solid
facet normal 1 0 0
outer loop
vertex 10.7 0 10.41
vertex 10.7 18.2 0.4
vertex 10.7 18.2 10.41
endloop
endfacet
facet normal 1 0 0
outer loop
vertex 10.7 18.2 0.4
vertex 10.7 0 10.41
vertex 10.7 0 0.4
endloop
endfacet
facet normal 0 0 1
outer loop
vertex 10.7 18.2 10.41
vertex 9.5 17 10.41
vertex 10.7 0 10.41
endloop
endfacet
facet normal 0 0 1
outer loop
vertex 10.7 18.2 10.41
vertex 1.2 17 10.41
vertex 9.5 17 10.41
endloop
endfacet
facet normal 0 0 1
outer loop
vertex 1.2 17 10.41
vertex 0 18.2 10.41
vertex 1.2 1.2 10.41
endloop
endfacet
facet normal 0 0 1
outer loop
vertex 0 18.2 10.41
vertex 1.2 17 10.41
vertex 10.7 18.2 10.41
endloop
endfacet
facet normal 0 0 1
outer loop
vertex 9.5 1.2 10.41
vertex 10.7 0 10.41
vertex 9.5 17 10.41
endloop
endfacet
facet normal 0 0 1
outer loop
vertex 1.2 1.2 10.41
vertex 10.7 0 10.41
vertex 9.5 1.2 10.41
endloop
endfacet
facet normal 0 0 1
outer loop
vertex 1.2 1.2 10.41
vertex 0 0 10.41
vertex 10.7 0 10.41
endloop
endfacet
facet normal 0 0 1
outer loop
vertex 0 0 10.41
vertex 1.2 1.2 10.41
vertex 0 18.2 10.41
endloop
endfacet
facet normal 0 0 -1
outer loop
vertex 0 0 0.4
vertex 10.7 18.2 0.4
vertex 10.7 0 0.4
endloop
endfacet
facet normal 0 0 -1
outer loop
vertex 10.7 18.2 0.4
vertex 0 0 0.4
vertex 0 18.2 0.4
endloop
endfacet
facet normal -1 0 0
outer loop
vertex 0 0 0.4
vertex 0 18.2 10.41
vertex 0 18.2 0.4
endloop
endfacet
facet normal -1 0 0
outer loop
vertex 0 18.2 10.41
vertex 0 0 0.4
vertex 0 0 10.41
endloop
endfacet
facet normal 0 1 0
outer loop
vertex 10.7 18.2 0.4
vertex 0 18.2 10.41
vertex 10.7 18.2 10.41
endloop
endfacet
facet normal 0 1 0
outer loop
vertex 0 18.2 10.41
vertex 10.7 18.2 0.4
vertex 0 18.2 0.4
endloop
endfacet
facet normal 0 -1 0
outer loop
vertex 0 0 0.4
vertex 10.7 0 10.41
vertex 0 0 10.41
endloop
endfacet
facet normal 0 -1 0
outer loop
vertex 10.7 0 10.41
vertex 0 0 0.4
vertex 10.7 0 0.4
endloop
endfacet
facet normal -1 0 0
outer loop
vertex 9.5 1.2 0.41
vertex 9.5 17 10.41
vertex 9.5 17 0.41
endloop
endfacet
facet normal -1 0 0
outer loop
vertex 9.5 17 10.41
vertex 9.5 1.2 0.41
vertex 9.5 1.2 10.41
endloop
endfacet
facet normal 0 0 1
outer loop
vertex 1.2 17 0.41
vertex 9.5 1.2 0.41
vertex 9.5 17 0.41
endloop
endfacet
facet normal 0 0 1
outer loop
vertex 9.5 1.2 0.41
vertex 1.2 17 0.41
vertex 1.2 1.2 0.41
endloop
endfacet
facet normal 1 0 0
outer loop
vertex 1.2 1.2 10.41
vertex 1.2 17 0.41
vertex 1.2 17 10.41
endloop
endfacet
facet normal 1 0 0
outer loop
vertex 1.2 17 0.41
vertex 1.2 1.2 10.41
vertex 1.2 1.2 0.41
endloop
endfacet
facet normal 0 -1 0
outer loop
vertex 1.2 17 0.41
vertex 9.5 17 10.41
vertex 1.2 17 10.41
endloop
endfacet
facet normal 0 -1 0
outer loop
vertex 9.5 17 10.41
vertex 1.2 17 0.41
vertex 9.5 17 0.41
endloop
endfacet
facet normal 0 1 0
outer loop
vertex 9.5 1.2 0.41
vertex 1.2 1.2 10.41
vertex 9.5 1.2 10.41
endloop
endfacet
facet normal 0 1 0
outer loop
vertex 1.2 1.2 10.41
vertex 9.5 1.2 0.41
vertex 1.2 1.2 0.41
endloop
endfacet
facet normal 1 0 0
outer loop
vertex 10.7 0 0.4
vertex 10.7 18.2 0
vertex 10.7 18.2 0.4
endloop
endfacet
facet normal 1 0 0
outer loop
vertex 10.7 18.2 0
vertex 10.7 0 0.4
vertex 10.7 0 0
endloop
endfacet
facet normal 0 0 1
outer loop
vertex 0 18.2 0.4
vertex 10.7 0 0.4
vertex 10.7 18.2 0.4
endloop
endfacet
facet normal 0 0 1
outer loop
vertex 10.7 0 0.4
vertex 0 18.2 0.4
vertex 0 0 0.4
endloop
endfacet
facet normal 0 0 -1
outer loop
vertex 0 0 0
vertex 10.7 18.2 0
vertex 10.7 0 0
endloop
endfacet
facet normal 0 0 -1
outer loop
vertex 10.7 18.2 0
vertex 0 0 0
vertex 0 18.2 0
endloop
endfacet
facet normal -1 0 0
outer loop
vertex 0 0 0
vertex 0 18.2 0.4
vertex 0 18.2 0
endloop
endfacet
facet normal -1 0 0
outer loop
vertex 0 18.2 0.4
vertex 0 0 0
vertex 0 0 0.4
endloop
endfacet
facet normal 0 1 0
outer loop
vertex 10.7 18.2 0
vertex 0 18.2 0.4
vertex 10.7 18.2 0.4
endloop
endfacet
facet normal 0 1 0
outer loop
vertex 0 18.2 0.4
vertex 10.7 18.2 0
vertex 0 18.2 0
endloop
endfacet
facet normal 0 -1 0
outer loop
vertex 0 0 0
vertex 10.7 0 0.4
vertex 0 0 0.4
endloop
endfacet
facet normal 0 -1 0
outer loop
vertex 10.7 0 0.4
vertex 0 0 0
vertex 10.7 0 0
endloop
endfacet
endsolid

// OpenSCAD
// file: ../../Base/Rotation.scad
// Fischertechnik Box Foundation
// Geometry Helpers Rotation

include <PlacementOptions.scad>

// getRotatedSpace(space, rotation=NoRotation)
// Rotates the space dependent on the specified rotation

function getRotatedSpace(space, rotation=NoRotation) = [
    (rotation == Rotate90 || rotation == Rotate270) ? space.y : space.x,
    (rotation == Rotate90 || rotation == Rotate270) ? space.x : space.y
];

// Rotates the given space around the fixed left lower corner
// space = the space the children needs as width/depth list [width,depth]
// rotation = 0 Rotate0 degrees, 1 Rotate90 degrees, 2 Rotate180 degrees, 3 Rotate270 degrees (equivalent to -90)

module RotateFix(space, rotation=NoRotation) {
    dy = (rotation == Rotate0 || rotation == Rotate270) ? 0 :
        (rotation == Rotate90) ? space.x :
        space.y;
    dx = (rotation < Rotate180) ? 0 :
        (rotation == Rotate180) ? space.x :
        space.y;
    
    translate([dx, dy, 0])
        rotate([0, 0, rotations[rotation]])
            children();
}
// file: ../../Base/Alignment.scad
// Fischertechnik Box Foundation
// Geometry Helpers Alignment

include <PlacementOptions.scad>

// getAlignedX(elementWidth, spaceWidth, align=AlignRight, offset=0)
// Gets the aligned X offset of an element with the given
// width in the given space.
// elementWidth = The width of the element to positon
// spaceWidth = The space where the element should be aligned
// align = 0 AlignLeft, 1 AlignCenter, 2 AlignRight
// offset = an optional offset from the aligned position. When
// aligned left or centered, then positive values are in X direction.
// When aligned right then positive values are in negative X direction.

function getAlignedX(elementWidth, spaceWidth, align=AlignRight, offset=0) =
    (align == AlignLeft) ?
        offset :
        ((align == AlignCenter) ?
        (spaceWidth - elementWidth)/2 + offset :
        spaceWidth - offset - elementWidth);

// getAlignedY(elementDepth, spaceDepth, align=AlignTop, offset=0)
// Gets the aligned Y offset of an element with the given
// depth in the given space.
// elementDepth = The depth of the element to positon
// spaceDepth = The space where the element should be aligned
// align = 0 AlignBottom, 1 AlignCenter, 2 AlignTop
// offset = an optional offset from the aligned position. When
// aligned bottom or centered, then positive values are in Y direction.
// When aligned top then positive values are in negative Y direction.

function getAlignedY(elementDepth, spaceDepth, align=AlignTop, offset=0) =
    (align == AlignBottom) ?
        offset :
        ((align == AlignCenter) ?
        (spaceDepth - elementDepth)/2 + offset :
        spaceDepth - offset - elementDepth);
// file: ../../Base/PlacementOptions.scad
// Fischertechnik Box Foundation
// Placement Options

// Alignment
NoAlign = 0;
AlignLeft = 1;
AlignBottom = 2;
AlignCenter = 3;
AlignRight = 4;
AlignTop = 5;

// Element rotation degree steps
rotations = [0, -90, -180, -270];

// Rotation
NoRotation = 0;
Rotate0 = 0;
Rotate90 = 1;
Rotate180 = 2;
Rotate270 = 3;

// Docking (seen from above)
NoDock = -1;
DockLeft = 0;
DockTop = 1;
DockRight = 2;
DockCorner = 2;
DockBottom = 3;

// Web corners
LowerLeft = 0;
UpperLeft = 1;
UpperRight = 2;
LowerRight = 3;

// Web position relative to corner
LeftOfCorner = 0;
RightOfCorner = 1;

// Rails direction
Horizontal = true;
Vertical = false;
// file: ../../Base/Boxes.scad
// Fischertechnik Box Foundation
// Pre-designed Boxes

use <Constants.scad>

include <PlacementOptions.scad>

box190Width = 190.6;
box190Depth = 130.6;
box130Width = 130.6;
box130Depth = 95.6;

// Values are from an original Box 1000 sorting box
topBottomDifference = 1.7;
outerHeight = 40;
baseThickness = 1.2;
innerHeight = outerHeight - baseThickness;
stackExcess = 5.7;
radius = 2.5;
wallThickness = 1.2;
tolerance = 0.2;

boxWallThickness = wallThickness;
boxBaseThickness = baseThickness;
boxWebWidth = 3.0;

// getBoxWallThickness()
// Gets the wall thickness of a Fischertechnik Box
function getBoxWallThickness() = boxWallThickness;

// getBoxUsageHeight(height = 38.2)
// Gets the usable height of a Fischertechnik box
// height = Outer height of the box from the bottom to the upper edge.
function getBoxUsageHeight(height = outerHeight) = height - baseThickness - stackExcess;

// getBoxInnerHeight()
// Gets the inner height of a Fischertechnik box, including the stack excess
function getBoxInnerHeight() = innerHeight;

// getBoxBaseThickness()
// Gets the thickness of the Fischertechnik box base.
function getBoxBaseThickness() = boxBaseThickness;

// getBoxWebWidth()
// Gets the width of a box web
function getBoxWebWidth() = boxWebWidth;

// getBox190Space()
// Gets the usable inner space of a Box 190 as an x/y-list
function getBox190Space() = [
    box190Width - 2*getBoxWallThickness() - topBottomDifference, 
    box190Depth - 2*getBoxWallThickness() - topBottomDifference ];

// RoundedCornerPlate(width, depth, height, radius)
// Creates a body plate with rounded corners for a box. Used
// also to create the complete box with the hull module.
// width = Width of the plate
// depth = depth of the plate 
// height = thickness of the plate
// radius = radius of the rounded corner
module RoundedCornerPlate(width, depth, height, radius) {
    translate([radius, radius])
    hull() {
        w = width-2*radius;
        d = depth-2*radius;
        cube([w, d, height]);
        cylinder(height, r=radius, $fn=getFragments());
        translate([w, 0])
            cylinder(height, r=radius, $fn=getFragments());
        translate([w, d])
            cylinder(height, r=radius, $fn=getFragments());
        translate([0, d])
            cylinder(height, r=radius, $fn=getFragments());
    }
}

// BoxBase(width, depth)
// Creates an empty stackable Fischertechnik compatible box
// width = Outer width of the box (190, 130, ...)
// depth = Outer depth of the box (130, 95, ...)

module BoxBase(width, depth, height=outerHeight) {    
    thinPlate = 0.01;

    innerHeight = height - baseThickness;    
    
    module Body(tolerance=tolerance) {
        hull() {
            // Bottom with tolerance to fit into the original boxes when stacked
            translate([-wallThickness+tolerance, -wallThickness+tolerance, -baseThickness])
                RoundedCornerPlate(width-topBottomDifference-2*tolerance, depth-topBottomDifference-2*tolerance, thinPlate, radius);
            
            // Top
            translate([-wallThickness-topBottomDifference/2, -wallThickness-topBottomDifference/2, innerHeight-thinPlate])
                RoundedCornerPlate(width, depth, thinPlate, radius);                
         }
    }

    module Cutoff() {
        hull() {
            coWidth = width - 2*wallThickness;
            coDepth = depth - 2*wallThickness;
            
            // Bottom
            RoundedCornerPlate(coWidth-topBottomDifference, coDepth-topBottomDifference, thinPlate, radius);

            // Top
            translate([-topBottomDifference/2, -topBottomDifference/2, innerHeight+thinPlate]) 
                RoundedCornerPlate(coWidth, coDepth, thinPlate, radius);
        }
    }
    
    difference() {        
        Body();
        Cutoff();
        stackOffset = innerHeight - stackExcess;
        translate([0, 0, stackOffset + baseThickness])
            Body(tolerance=0);
    }
}

// Creates the Fischertechnik empty box 130x190 mm and places it at position 0,0
// 190x130 are the outer sizes, the inner space is slightly smaller. Use getBox190Space() to get the inner sizes.
// The box is positioned that the usable inner space is at the 0,0,0 position.

module Box190() {
    BoxBase(box190Width, box190Depth);
}

// Gets the usable inner space of a Box 130 as an x/y-list
function getBox130Space() = [
    box130Width - 2*getBoxWallThickness() - topBottomDifference, 
    box130Depth - 2*getBoxWallThickness() - topBottomDifference ];

// Creates the Fischertechnik empty box 95x130 mm and places it at position 0,0
// 190x130 are the outer sizes, the inner space is slightly smaller. Use getBox190Space() to get the inner sizes.
// The box is positioned that the usable inner space is at the 0,0,0 position.

module Box130() {
    BoxBase(box130Width, box130Depth);
}

// Creates a web at the specified box walls
// corner 0 = LowerLeft, 1 = UpperLeft, 2 = UpperRight, 3 = LowerRight
// side 0 = LeftOfCorner, 1 = RightOfCorner
// distance = Distance in mm from the corner
// boxSpace = inner width and depth of the box (default: Box 190)
// webWidth = length of the web (default is 3 mms)
// webThickness = thickness of the web (default is 1 mm)
// height = Height of the web (standard is getBoxUsageHeight())
// sink = How much of the web is sunk into the wall

module BoxWeb(
    corner, 
    side, 
    distance, 
    boxSpace=getBox190Space(), 
    webWidth=getBoxWebWidth(), 
    webThickness=1.0, 
    height=getBoxUsageHeight(),
    sink = getBoxWallThickness()/2) {
    width = (corner % 2 == 0) ? 
            (side == LeftOfCorner ? webWidth : webThickness) :
            (side == LeftOfCorner ? webThickness : webWidth);

    depth = (corner % 2 == 0) ? 
            (side == RightOfCorner ? webWidth : webThickness) :
            (side == RightOfCorner ? webThickness : webWidth);
    
    xDiff = corner == LowerLeft ? 
                (side == LeftOfCorner ? -sink : distance) :
            (corner == UpperLeft ?                
                (side == LeftOfCorner ? distance : -sink) :
            (corner == UpperRight ?
                (side == LeftOfCorner ? boxSpace.x-webWidth+sink : boxSpace.x-distance-webThickness) :
                (side == LeftOfCorner ? boxSpace.x-distance-webThickness: boxSpace.x-webWidth+sink)));

    yDiff = corner == LowerLeft ? 
                (side == RightOfCorner ? -sink : distance) :
            (corner == UpperLeft ?
                (side == RightOfCorner ? boxSpace.y-distance-webThickness : boxSpace.y-webWidth+sink) :
            (corner == UpperRight ?
                (side == RightOfCorner ? boxSpace.y-webWidth+sink : boxSpace.y-distance-webThickness) :
                (side == RightOfCorner ? distance : -sink)));
    
    translate([xDiff, yDiff, -getExcess()])
        cube([width, depth, height + 2*getExcess()]);
}
// file: ../../Base/Placement.scad
// Fischertechnik Box Foundation
// Geometry Helpers Placement

use <Constants.scad>
use <Alignment.scad>
use <Rotation.scad>
use <Boxes.scad>

include <PlacementOptions.scad>

// Place(x=0, y=0, elementSpace=[0,0], alignX=AlignLeft, alignY=AlignBottom, rotation=Rotate0, boxSpace=getBox190Space())
// Places the child at the specified position
// y = Y-Position. This is a relative position when an X aligment is specified.
// x = X-Position. This is a relative position when an Y aligment is specified.
// elementSpace = space of the element to be placed [x,y]
// alignX = -1=NoAlign, 0 AlignLeft, 1 AlignCenter, 3 AlignRight (elementSpace and boxSpace required!)
// alignY = -1=NoAlign, 2 AlignBottom, 1 AlignCenter, 4 AlignTop (elementSpace and boxSpace required!)
// rotation = 0 Rotate0 0 degrees, 1 Rotate90 90 degrees, 
// 2 Rotate180 180 degrees, 3 Rotate270 270 degrees (equivalent to -90)
// boxSpace = Inner space of the box where the placement occurs [x,y] - default is Box 190x130 inner space

module Place(x=0, y=0, elementSpace=[0,0], 
  alignX=AlignLeft, alignY=AlignBottom, 
  rotation=NoRotation, boxSpace=getBox190Space()) {

    module Position(x, y, space, rotation=Rotate0) {
        translate([x, y, 0])
            RotateFix(space, rotation)
                children();
    }

    space = getRotatedSpace(elementSpace, rotation);
    alignedX = getAlignedX(space.x, boxSpace.x, alignX, x);
    alignedY = getAlignedY(space.y, boxSpace.y, alignY, y);
    Position(alignedX, alignedY, elementSpace, rotation)
        children();
}

// Center(space=getBox130Space(), elementSpace=[0,0])
// space = Space where the children is centered. For cylinder use centered=true and no elementSpace.
// elementSpace = space of the element to be centered [x,y]

module Center(space=getBox190Space(), elementSpace=[0,0]) {
    Place(elementSpace=elementSpace, boxSpace=space, alignX=AlignCenter, alignY=AlignCenter)
        children();
}

// CenterHorizontal(width=0, y=0, offset=0, space=getBox130Space())
// width = Width of the element to be placed.
// y = Y position of the element
// offset = Offset from the center position (negative will be left of the center)
// space = Space where the element is placed

module CenterHorizontal(width=0, y=0, offset=0, space=getBox190Space()) {
    Place(x=offset, y=y, elementSpace=[width, 0], boxSpace=space, alignX=AlignCenter)
        children(0);
}

// CenterVertical(depth=0, x=0, offset=0, space=getBox130Space())
// depth = Depth of the element to be placed.
// x = X position of the element
// offset = Offset from the center position (negative will be down of the center)
// space = Space where the element is placed

module CenterVertical(depth=0, x=0, offset=0, space=getBox190Space()) {
    Place(x=x, y=offset, elementSpace=[0, depth], boxSpace=space, alignY=AlignCenter)
        children(0);
}

// getIsVertical(align)
// True if the specified alignment needs a vertical orientation for a divider (AlignRight, AlignLeft)

function getIsVertical(align) = (align == AlignRight || align == AlignLeft);

// getIsHorizontal(align)
// True if the specified alignment needs a horizontal orientation for a divider (AlignTop, AlignBottom)

function getIsHorizontal(align) = (align == AlignTop || align == AlignBottom);
// file: ../../Elements/AxisClip10.scad
// Fischertechnik Box Library
// Axis for clip 10
// 31023

use <../ModelBase/Simple.scad>
use <../Base/Constants.scad>

/* [Element Parameters] */
height = 23;
clipHeight = 10;

/* [Hidden] */
width = 12;
depth = 12;
upperDiameter = 3.6;

// getAxisClip10Space()
// Gets the space of a n axis for a clip 10 with spring ring (mot2)

function getAxisClip10Space() = [width, depth, height];

// AxisClip10(height, clipHeight)
// Axis for clip 10 with spring ring (mot2)
// height = Height of the complete axis (standard is 23, in mot3 its only 12)
// clipHeight = Height of the part for the clip (standard is 10, in mot3 its only 7)

module AxisClip10(height=height, clipHeight=clipHeight) {
    LeveledAxisWithSpace(height, height-clipHeight, getAxisClip10Space(), diameter=upperDiameter);
}

// Test
color("lightgray")
AxisClip10(height, clipHeight);
// file: ../../Base/Constants.scad
// Fischertechnik Box Foundation
// Constants

// Constant values necessary for multiple elements

// Base constants
dividerThickness = 1.2;
excess = 0.01;
fragments = 90;
tolerance = 0.8;

// Gets the thickness of a divider 
function getDividerThickness() = dividerThickness;

// Gets the excess that is used to merge walls into each other
function getExcess() = excess;

// Gets amount of fragments of a cylinder
function getFragments() = fragments;

// Gets the inner tolerance of a frame to each side
function getTolerance() = tolerance;


// Fischertechnik specific constants
axisDiameter = 4;
axisBottomDiameter = axisDiameter + 1;
axisTolerance = 0.2;
axisLockingLength = 8;

// Gets axis diameter of Fischertechnik axis
function getAxisDiameter() = axisDiameter;

// Gets axis diameter tolerance (subtracted for element axis)
function getAxisTolerance() = axisTolerance;

// Gets the axis diameter for standing axis
function getStandAxisDiameter() = getAxisDiameter() - getAxisTolerance();

// Gets axis bottom diameter for thicker part at the bottom
function getAxisBottomDiameter() = axisBottomDiameter;

// Gets the lengthh of the locking part of a locking axis
function getAxisLockingLength() = axisLockingLength;

// Studs

studHeight = 2.5;
studTolerance = 0.2;
studRailDistance = 9;   // as in ft 50

// gets the height of a connecting stud
function getStudHeight() = studHeight;

// gets the connecting stud height tolerance
function getStudTolerance() = studTolerance;

// gets the default rail distance for studs
function getStudRailDistance() = studRailDistance;

// Dockable Frame with Edge

standardEdgeDistance = 2.5;
standardWebDistance = 11.5;
standardCornerLength = 15;

// gets the standard distance to the wall of the box for dockable frames with webs
function getStandardEdgeDistance() = standardEdgeDistance;

// gets the standard distance of each web to the corner of the dockable frame
function getStandardWebDistance() = standardWebDistance;

// gets the standard length of the corner walls of a dockable frame
function getStandardCornerLength() = standardCornerLength;

// Tubes

tubeWallFactor = 0.8;

// gets the wall thickness of a tube.
function getTubeWallThickness() = tubeWallFactor * getDividerThickness();

// Small Parts and Divider Frame

smallPartsFrameHeight = 20;

// gets the frame height for docked small parts boxes.
function getSmallPartsFrameHeight() = smallPartsFrameHeight;

// Hubs

hubRingDiameter = 19.5;
hubRingLevelDiameter = 21;

// gets the diameter of a tube matching the inner ring of a wheel
function getHubRingDiameter() = hubRingDiameter;

// gets the diameter of a hub tube with a thicker diameter
function getHubRingLevelDiameter() = hubRingLevelDiameter;

// Struts

strutAddLength = 9.0;
strutDepth = 8.0;
strutThickness = 2.8;
strutOuterTolerance = 0.6;

// gets the full length of a strut (nominal length plus 2x radius at the ends)
function getFullStrutLength(length) = length + strutAddLength;

// gets the radius of the end of a strut
function getStrutEndRadius() = strutAddLength / 2;

// gets the the depth (width) of a strut
function getStrutDepth() = strutDepth;

// gets the the thickness of a strut
function getStrutThickness() = strutThickness;

// gets the tolerance added to the strut sizes for strut holders
function getStrutOuterTolerance() = strutOuterTolerance;

// Propeller

propellerAxisDiameter = 7.0;
propellerAxisTolerance = 0.2;

// gets the propeller axis outer diameter
function getPropellerAxisDiameter() = propellerAxisDiameter;

// gets the propeller axis printing tolerance
function getPropellerAxisTolerance() = propellerAxisTolerance;
// file: ../../Elements/FrameBlock5.scad
// Fischertechnik Box Library
// Frame for small blocks 5
// 37237, 37468

use <../Base/Constants.scad>
use <../ModelBase/Simple.scad>

/* [Element Parameters] */
count = 1;

/* [Hidden] */
width = 7.5;
depth = 15;
height = 10;
wallThickness = 2.5 - getTolerance();
wallHeight = 7.5;
wallCutoffWidth = 10;
wallDistance = 5 + getTolerance();

// getFrameSmallBlockSpace(count=1)
// Gets the space of a frame for count blocks 5mm

function getFrameBlock5Space(count=1) = getFrameOuterVolume([width * count, depth, height]);

// FrameSmallBlock(count=1)
// frame for count blocks 5mm

module FrameBlock5(count=1) {
    frameVolume = [width * count, depth, height];

    module InnerDivider(count) {
        volume = [wallThickness, depth + getTolerance() + 2*getExcess(), wallHeight];
        cutoffVolume = [wallThickness+1, wallCutoffWidth, wallHeight + 1];
        for(i = [1:count])
            translate([getDividerThickness() + ((i - 1) * width) + wallDistance, getDividerThickness()-getExcess()]) {
                difference() {
                    Wall(volume);
                    translate([-0.5, (getFrameInnerVolume(frameVolume).y - wallCutoffWidth)/2])
                    cube(cutoffVolume);
                }
            }
    }

    Frame(frameVolume);
    if (count > 1)
        InnerDivider(count - 1);
}

// Tests
color("lightgray")
FrameBlock5(count);
// file: ../TestPrint.scad
// 3D Print Test Base

use <../Base/Constants.scad>

use <../Elements/AxisClip10.scad>

module TestPrint(elementSpace) {
    cube([elementSpace.x, elementSpace.y, 0.4]);
    translate([0,0,0.4+getExcess()]) {
        children();
    }
}

TestPrint(getAxisClip10Space())
    AxisClip10();
// main file
// 3D Print Test
// FrameBlock5

use <../TestPrint.scad>
use <../../Elements/FrameBlock5.scad>

count = 1;

TestPrint(getFrameBlock5Space(count))
    FrameBlock5(count);
